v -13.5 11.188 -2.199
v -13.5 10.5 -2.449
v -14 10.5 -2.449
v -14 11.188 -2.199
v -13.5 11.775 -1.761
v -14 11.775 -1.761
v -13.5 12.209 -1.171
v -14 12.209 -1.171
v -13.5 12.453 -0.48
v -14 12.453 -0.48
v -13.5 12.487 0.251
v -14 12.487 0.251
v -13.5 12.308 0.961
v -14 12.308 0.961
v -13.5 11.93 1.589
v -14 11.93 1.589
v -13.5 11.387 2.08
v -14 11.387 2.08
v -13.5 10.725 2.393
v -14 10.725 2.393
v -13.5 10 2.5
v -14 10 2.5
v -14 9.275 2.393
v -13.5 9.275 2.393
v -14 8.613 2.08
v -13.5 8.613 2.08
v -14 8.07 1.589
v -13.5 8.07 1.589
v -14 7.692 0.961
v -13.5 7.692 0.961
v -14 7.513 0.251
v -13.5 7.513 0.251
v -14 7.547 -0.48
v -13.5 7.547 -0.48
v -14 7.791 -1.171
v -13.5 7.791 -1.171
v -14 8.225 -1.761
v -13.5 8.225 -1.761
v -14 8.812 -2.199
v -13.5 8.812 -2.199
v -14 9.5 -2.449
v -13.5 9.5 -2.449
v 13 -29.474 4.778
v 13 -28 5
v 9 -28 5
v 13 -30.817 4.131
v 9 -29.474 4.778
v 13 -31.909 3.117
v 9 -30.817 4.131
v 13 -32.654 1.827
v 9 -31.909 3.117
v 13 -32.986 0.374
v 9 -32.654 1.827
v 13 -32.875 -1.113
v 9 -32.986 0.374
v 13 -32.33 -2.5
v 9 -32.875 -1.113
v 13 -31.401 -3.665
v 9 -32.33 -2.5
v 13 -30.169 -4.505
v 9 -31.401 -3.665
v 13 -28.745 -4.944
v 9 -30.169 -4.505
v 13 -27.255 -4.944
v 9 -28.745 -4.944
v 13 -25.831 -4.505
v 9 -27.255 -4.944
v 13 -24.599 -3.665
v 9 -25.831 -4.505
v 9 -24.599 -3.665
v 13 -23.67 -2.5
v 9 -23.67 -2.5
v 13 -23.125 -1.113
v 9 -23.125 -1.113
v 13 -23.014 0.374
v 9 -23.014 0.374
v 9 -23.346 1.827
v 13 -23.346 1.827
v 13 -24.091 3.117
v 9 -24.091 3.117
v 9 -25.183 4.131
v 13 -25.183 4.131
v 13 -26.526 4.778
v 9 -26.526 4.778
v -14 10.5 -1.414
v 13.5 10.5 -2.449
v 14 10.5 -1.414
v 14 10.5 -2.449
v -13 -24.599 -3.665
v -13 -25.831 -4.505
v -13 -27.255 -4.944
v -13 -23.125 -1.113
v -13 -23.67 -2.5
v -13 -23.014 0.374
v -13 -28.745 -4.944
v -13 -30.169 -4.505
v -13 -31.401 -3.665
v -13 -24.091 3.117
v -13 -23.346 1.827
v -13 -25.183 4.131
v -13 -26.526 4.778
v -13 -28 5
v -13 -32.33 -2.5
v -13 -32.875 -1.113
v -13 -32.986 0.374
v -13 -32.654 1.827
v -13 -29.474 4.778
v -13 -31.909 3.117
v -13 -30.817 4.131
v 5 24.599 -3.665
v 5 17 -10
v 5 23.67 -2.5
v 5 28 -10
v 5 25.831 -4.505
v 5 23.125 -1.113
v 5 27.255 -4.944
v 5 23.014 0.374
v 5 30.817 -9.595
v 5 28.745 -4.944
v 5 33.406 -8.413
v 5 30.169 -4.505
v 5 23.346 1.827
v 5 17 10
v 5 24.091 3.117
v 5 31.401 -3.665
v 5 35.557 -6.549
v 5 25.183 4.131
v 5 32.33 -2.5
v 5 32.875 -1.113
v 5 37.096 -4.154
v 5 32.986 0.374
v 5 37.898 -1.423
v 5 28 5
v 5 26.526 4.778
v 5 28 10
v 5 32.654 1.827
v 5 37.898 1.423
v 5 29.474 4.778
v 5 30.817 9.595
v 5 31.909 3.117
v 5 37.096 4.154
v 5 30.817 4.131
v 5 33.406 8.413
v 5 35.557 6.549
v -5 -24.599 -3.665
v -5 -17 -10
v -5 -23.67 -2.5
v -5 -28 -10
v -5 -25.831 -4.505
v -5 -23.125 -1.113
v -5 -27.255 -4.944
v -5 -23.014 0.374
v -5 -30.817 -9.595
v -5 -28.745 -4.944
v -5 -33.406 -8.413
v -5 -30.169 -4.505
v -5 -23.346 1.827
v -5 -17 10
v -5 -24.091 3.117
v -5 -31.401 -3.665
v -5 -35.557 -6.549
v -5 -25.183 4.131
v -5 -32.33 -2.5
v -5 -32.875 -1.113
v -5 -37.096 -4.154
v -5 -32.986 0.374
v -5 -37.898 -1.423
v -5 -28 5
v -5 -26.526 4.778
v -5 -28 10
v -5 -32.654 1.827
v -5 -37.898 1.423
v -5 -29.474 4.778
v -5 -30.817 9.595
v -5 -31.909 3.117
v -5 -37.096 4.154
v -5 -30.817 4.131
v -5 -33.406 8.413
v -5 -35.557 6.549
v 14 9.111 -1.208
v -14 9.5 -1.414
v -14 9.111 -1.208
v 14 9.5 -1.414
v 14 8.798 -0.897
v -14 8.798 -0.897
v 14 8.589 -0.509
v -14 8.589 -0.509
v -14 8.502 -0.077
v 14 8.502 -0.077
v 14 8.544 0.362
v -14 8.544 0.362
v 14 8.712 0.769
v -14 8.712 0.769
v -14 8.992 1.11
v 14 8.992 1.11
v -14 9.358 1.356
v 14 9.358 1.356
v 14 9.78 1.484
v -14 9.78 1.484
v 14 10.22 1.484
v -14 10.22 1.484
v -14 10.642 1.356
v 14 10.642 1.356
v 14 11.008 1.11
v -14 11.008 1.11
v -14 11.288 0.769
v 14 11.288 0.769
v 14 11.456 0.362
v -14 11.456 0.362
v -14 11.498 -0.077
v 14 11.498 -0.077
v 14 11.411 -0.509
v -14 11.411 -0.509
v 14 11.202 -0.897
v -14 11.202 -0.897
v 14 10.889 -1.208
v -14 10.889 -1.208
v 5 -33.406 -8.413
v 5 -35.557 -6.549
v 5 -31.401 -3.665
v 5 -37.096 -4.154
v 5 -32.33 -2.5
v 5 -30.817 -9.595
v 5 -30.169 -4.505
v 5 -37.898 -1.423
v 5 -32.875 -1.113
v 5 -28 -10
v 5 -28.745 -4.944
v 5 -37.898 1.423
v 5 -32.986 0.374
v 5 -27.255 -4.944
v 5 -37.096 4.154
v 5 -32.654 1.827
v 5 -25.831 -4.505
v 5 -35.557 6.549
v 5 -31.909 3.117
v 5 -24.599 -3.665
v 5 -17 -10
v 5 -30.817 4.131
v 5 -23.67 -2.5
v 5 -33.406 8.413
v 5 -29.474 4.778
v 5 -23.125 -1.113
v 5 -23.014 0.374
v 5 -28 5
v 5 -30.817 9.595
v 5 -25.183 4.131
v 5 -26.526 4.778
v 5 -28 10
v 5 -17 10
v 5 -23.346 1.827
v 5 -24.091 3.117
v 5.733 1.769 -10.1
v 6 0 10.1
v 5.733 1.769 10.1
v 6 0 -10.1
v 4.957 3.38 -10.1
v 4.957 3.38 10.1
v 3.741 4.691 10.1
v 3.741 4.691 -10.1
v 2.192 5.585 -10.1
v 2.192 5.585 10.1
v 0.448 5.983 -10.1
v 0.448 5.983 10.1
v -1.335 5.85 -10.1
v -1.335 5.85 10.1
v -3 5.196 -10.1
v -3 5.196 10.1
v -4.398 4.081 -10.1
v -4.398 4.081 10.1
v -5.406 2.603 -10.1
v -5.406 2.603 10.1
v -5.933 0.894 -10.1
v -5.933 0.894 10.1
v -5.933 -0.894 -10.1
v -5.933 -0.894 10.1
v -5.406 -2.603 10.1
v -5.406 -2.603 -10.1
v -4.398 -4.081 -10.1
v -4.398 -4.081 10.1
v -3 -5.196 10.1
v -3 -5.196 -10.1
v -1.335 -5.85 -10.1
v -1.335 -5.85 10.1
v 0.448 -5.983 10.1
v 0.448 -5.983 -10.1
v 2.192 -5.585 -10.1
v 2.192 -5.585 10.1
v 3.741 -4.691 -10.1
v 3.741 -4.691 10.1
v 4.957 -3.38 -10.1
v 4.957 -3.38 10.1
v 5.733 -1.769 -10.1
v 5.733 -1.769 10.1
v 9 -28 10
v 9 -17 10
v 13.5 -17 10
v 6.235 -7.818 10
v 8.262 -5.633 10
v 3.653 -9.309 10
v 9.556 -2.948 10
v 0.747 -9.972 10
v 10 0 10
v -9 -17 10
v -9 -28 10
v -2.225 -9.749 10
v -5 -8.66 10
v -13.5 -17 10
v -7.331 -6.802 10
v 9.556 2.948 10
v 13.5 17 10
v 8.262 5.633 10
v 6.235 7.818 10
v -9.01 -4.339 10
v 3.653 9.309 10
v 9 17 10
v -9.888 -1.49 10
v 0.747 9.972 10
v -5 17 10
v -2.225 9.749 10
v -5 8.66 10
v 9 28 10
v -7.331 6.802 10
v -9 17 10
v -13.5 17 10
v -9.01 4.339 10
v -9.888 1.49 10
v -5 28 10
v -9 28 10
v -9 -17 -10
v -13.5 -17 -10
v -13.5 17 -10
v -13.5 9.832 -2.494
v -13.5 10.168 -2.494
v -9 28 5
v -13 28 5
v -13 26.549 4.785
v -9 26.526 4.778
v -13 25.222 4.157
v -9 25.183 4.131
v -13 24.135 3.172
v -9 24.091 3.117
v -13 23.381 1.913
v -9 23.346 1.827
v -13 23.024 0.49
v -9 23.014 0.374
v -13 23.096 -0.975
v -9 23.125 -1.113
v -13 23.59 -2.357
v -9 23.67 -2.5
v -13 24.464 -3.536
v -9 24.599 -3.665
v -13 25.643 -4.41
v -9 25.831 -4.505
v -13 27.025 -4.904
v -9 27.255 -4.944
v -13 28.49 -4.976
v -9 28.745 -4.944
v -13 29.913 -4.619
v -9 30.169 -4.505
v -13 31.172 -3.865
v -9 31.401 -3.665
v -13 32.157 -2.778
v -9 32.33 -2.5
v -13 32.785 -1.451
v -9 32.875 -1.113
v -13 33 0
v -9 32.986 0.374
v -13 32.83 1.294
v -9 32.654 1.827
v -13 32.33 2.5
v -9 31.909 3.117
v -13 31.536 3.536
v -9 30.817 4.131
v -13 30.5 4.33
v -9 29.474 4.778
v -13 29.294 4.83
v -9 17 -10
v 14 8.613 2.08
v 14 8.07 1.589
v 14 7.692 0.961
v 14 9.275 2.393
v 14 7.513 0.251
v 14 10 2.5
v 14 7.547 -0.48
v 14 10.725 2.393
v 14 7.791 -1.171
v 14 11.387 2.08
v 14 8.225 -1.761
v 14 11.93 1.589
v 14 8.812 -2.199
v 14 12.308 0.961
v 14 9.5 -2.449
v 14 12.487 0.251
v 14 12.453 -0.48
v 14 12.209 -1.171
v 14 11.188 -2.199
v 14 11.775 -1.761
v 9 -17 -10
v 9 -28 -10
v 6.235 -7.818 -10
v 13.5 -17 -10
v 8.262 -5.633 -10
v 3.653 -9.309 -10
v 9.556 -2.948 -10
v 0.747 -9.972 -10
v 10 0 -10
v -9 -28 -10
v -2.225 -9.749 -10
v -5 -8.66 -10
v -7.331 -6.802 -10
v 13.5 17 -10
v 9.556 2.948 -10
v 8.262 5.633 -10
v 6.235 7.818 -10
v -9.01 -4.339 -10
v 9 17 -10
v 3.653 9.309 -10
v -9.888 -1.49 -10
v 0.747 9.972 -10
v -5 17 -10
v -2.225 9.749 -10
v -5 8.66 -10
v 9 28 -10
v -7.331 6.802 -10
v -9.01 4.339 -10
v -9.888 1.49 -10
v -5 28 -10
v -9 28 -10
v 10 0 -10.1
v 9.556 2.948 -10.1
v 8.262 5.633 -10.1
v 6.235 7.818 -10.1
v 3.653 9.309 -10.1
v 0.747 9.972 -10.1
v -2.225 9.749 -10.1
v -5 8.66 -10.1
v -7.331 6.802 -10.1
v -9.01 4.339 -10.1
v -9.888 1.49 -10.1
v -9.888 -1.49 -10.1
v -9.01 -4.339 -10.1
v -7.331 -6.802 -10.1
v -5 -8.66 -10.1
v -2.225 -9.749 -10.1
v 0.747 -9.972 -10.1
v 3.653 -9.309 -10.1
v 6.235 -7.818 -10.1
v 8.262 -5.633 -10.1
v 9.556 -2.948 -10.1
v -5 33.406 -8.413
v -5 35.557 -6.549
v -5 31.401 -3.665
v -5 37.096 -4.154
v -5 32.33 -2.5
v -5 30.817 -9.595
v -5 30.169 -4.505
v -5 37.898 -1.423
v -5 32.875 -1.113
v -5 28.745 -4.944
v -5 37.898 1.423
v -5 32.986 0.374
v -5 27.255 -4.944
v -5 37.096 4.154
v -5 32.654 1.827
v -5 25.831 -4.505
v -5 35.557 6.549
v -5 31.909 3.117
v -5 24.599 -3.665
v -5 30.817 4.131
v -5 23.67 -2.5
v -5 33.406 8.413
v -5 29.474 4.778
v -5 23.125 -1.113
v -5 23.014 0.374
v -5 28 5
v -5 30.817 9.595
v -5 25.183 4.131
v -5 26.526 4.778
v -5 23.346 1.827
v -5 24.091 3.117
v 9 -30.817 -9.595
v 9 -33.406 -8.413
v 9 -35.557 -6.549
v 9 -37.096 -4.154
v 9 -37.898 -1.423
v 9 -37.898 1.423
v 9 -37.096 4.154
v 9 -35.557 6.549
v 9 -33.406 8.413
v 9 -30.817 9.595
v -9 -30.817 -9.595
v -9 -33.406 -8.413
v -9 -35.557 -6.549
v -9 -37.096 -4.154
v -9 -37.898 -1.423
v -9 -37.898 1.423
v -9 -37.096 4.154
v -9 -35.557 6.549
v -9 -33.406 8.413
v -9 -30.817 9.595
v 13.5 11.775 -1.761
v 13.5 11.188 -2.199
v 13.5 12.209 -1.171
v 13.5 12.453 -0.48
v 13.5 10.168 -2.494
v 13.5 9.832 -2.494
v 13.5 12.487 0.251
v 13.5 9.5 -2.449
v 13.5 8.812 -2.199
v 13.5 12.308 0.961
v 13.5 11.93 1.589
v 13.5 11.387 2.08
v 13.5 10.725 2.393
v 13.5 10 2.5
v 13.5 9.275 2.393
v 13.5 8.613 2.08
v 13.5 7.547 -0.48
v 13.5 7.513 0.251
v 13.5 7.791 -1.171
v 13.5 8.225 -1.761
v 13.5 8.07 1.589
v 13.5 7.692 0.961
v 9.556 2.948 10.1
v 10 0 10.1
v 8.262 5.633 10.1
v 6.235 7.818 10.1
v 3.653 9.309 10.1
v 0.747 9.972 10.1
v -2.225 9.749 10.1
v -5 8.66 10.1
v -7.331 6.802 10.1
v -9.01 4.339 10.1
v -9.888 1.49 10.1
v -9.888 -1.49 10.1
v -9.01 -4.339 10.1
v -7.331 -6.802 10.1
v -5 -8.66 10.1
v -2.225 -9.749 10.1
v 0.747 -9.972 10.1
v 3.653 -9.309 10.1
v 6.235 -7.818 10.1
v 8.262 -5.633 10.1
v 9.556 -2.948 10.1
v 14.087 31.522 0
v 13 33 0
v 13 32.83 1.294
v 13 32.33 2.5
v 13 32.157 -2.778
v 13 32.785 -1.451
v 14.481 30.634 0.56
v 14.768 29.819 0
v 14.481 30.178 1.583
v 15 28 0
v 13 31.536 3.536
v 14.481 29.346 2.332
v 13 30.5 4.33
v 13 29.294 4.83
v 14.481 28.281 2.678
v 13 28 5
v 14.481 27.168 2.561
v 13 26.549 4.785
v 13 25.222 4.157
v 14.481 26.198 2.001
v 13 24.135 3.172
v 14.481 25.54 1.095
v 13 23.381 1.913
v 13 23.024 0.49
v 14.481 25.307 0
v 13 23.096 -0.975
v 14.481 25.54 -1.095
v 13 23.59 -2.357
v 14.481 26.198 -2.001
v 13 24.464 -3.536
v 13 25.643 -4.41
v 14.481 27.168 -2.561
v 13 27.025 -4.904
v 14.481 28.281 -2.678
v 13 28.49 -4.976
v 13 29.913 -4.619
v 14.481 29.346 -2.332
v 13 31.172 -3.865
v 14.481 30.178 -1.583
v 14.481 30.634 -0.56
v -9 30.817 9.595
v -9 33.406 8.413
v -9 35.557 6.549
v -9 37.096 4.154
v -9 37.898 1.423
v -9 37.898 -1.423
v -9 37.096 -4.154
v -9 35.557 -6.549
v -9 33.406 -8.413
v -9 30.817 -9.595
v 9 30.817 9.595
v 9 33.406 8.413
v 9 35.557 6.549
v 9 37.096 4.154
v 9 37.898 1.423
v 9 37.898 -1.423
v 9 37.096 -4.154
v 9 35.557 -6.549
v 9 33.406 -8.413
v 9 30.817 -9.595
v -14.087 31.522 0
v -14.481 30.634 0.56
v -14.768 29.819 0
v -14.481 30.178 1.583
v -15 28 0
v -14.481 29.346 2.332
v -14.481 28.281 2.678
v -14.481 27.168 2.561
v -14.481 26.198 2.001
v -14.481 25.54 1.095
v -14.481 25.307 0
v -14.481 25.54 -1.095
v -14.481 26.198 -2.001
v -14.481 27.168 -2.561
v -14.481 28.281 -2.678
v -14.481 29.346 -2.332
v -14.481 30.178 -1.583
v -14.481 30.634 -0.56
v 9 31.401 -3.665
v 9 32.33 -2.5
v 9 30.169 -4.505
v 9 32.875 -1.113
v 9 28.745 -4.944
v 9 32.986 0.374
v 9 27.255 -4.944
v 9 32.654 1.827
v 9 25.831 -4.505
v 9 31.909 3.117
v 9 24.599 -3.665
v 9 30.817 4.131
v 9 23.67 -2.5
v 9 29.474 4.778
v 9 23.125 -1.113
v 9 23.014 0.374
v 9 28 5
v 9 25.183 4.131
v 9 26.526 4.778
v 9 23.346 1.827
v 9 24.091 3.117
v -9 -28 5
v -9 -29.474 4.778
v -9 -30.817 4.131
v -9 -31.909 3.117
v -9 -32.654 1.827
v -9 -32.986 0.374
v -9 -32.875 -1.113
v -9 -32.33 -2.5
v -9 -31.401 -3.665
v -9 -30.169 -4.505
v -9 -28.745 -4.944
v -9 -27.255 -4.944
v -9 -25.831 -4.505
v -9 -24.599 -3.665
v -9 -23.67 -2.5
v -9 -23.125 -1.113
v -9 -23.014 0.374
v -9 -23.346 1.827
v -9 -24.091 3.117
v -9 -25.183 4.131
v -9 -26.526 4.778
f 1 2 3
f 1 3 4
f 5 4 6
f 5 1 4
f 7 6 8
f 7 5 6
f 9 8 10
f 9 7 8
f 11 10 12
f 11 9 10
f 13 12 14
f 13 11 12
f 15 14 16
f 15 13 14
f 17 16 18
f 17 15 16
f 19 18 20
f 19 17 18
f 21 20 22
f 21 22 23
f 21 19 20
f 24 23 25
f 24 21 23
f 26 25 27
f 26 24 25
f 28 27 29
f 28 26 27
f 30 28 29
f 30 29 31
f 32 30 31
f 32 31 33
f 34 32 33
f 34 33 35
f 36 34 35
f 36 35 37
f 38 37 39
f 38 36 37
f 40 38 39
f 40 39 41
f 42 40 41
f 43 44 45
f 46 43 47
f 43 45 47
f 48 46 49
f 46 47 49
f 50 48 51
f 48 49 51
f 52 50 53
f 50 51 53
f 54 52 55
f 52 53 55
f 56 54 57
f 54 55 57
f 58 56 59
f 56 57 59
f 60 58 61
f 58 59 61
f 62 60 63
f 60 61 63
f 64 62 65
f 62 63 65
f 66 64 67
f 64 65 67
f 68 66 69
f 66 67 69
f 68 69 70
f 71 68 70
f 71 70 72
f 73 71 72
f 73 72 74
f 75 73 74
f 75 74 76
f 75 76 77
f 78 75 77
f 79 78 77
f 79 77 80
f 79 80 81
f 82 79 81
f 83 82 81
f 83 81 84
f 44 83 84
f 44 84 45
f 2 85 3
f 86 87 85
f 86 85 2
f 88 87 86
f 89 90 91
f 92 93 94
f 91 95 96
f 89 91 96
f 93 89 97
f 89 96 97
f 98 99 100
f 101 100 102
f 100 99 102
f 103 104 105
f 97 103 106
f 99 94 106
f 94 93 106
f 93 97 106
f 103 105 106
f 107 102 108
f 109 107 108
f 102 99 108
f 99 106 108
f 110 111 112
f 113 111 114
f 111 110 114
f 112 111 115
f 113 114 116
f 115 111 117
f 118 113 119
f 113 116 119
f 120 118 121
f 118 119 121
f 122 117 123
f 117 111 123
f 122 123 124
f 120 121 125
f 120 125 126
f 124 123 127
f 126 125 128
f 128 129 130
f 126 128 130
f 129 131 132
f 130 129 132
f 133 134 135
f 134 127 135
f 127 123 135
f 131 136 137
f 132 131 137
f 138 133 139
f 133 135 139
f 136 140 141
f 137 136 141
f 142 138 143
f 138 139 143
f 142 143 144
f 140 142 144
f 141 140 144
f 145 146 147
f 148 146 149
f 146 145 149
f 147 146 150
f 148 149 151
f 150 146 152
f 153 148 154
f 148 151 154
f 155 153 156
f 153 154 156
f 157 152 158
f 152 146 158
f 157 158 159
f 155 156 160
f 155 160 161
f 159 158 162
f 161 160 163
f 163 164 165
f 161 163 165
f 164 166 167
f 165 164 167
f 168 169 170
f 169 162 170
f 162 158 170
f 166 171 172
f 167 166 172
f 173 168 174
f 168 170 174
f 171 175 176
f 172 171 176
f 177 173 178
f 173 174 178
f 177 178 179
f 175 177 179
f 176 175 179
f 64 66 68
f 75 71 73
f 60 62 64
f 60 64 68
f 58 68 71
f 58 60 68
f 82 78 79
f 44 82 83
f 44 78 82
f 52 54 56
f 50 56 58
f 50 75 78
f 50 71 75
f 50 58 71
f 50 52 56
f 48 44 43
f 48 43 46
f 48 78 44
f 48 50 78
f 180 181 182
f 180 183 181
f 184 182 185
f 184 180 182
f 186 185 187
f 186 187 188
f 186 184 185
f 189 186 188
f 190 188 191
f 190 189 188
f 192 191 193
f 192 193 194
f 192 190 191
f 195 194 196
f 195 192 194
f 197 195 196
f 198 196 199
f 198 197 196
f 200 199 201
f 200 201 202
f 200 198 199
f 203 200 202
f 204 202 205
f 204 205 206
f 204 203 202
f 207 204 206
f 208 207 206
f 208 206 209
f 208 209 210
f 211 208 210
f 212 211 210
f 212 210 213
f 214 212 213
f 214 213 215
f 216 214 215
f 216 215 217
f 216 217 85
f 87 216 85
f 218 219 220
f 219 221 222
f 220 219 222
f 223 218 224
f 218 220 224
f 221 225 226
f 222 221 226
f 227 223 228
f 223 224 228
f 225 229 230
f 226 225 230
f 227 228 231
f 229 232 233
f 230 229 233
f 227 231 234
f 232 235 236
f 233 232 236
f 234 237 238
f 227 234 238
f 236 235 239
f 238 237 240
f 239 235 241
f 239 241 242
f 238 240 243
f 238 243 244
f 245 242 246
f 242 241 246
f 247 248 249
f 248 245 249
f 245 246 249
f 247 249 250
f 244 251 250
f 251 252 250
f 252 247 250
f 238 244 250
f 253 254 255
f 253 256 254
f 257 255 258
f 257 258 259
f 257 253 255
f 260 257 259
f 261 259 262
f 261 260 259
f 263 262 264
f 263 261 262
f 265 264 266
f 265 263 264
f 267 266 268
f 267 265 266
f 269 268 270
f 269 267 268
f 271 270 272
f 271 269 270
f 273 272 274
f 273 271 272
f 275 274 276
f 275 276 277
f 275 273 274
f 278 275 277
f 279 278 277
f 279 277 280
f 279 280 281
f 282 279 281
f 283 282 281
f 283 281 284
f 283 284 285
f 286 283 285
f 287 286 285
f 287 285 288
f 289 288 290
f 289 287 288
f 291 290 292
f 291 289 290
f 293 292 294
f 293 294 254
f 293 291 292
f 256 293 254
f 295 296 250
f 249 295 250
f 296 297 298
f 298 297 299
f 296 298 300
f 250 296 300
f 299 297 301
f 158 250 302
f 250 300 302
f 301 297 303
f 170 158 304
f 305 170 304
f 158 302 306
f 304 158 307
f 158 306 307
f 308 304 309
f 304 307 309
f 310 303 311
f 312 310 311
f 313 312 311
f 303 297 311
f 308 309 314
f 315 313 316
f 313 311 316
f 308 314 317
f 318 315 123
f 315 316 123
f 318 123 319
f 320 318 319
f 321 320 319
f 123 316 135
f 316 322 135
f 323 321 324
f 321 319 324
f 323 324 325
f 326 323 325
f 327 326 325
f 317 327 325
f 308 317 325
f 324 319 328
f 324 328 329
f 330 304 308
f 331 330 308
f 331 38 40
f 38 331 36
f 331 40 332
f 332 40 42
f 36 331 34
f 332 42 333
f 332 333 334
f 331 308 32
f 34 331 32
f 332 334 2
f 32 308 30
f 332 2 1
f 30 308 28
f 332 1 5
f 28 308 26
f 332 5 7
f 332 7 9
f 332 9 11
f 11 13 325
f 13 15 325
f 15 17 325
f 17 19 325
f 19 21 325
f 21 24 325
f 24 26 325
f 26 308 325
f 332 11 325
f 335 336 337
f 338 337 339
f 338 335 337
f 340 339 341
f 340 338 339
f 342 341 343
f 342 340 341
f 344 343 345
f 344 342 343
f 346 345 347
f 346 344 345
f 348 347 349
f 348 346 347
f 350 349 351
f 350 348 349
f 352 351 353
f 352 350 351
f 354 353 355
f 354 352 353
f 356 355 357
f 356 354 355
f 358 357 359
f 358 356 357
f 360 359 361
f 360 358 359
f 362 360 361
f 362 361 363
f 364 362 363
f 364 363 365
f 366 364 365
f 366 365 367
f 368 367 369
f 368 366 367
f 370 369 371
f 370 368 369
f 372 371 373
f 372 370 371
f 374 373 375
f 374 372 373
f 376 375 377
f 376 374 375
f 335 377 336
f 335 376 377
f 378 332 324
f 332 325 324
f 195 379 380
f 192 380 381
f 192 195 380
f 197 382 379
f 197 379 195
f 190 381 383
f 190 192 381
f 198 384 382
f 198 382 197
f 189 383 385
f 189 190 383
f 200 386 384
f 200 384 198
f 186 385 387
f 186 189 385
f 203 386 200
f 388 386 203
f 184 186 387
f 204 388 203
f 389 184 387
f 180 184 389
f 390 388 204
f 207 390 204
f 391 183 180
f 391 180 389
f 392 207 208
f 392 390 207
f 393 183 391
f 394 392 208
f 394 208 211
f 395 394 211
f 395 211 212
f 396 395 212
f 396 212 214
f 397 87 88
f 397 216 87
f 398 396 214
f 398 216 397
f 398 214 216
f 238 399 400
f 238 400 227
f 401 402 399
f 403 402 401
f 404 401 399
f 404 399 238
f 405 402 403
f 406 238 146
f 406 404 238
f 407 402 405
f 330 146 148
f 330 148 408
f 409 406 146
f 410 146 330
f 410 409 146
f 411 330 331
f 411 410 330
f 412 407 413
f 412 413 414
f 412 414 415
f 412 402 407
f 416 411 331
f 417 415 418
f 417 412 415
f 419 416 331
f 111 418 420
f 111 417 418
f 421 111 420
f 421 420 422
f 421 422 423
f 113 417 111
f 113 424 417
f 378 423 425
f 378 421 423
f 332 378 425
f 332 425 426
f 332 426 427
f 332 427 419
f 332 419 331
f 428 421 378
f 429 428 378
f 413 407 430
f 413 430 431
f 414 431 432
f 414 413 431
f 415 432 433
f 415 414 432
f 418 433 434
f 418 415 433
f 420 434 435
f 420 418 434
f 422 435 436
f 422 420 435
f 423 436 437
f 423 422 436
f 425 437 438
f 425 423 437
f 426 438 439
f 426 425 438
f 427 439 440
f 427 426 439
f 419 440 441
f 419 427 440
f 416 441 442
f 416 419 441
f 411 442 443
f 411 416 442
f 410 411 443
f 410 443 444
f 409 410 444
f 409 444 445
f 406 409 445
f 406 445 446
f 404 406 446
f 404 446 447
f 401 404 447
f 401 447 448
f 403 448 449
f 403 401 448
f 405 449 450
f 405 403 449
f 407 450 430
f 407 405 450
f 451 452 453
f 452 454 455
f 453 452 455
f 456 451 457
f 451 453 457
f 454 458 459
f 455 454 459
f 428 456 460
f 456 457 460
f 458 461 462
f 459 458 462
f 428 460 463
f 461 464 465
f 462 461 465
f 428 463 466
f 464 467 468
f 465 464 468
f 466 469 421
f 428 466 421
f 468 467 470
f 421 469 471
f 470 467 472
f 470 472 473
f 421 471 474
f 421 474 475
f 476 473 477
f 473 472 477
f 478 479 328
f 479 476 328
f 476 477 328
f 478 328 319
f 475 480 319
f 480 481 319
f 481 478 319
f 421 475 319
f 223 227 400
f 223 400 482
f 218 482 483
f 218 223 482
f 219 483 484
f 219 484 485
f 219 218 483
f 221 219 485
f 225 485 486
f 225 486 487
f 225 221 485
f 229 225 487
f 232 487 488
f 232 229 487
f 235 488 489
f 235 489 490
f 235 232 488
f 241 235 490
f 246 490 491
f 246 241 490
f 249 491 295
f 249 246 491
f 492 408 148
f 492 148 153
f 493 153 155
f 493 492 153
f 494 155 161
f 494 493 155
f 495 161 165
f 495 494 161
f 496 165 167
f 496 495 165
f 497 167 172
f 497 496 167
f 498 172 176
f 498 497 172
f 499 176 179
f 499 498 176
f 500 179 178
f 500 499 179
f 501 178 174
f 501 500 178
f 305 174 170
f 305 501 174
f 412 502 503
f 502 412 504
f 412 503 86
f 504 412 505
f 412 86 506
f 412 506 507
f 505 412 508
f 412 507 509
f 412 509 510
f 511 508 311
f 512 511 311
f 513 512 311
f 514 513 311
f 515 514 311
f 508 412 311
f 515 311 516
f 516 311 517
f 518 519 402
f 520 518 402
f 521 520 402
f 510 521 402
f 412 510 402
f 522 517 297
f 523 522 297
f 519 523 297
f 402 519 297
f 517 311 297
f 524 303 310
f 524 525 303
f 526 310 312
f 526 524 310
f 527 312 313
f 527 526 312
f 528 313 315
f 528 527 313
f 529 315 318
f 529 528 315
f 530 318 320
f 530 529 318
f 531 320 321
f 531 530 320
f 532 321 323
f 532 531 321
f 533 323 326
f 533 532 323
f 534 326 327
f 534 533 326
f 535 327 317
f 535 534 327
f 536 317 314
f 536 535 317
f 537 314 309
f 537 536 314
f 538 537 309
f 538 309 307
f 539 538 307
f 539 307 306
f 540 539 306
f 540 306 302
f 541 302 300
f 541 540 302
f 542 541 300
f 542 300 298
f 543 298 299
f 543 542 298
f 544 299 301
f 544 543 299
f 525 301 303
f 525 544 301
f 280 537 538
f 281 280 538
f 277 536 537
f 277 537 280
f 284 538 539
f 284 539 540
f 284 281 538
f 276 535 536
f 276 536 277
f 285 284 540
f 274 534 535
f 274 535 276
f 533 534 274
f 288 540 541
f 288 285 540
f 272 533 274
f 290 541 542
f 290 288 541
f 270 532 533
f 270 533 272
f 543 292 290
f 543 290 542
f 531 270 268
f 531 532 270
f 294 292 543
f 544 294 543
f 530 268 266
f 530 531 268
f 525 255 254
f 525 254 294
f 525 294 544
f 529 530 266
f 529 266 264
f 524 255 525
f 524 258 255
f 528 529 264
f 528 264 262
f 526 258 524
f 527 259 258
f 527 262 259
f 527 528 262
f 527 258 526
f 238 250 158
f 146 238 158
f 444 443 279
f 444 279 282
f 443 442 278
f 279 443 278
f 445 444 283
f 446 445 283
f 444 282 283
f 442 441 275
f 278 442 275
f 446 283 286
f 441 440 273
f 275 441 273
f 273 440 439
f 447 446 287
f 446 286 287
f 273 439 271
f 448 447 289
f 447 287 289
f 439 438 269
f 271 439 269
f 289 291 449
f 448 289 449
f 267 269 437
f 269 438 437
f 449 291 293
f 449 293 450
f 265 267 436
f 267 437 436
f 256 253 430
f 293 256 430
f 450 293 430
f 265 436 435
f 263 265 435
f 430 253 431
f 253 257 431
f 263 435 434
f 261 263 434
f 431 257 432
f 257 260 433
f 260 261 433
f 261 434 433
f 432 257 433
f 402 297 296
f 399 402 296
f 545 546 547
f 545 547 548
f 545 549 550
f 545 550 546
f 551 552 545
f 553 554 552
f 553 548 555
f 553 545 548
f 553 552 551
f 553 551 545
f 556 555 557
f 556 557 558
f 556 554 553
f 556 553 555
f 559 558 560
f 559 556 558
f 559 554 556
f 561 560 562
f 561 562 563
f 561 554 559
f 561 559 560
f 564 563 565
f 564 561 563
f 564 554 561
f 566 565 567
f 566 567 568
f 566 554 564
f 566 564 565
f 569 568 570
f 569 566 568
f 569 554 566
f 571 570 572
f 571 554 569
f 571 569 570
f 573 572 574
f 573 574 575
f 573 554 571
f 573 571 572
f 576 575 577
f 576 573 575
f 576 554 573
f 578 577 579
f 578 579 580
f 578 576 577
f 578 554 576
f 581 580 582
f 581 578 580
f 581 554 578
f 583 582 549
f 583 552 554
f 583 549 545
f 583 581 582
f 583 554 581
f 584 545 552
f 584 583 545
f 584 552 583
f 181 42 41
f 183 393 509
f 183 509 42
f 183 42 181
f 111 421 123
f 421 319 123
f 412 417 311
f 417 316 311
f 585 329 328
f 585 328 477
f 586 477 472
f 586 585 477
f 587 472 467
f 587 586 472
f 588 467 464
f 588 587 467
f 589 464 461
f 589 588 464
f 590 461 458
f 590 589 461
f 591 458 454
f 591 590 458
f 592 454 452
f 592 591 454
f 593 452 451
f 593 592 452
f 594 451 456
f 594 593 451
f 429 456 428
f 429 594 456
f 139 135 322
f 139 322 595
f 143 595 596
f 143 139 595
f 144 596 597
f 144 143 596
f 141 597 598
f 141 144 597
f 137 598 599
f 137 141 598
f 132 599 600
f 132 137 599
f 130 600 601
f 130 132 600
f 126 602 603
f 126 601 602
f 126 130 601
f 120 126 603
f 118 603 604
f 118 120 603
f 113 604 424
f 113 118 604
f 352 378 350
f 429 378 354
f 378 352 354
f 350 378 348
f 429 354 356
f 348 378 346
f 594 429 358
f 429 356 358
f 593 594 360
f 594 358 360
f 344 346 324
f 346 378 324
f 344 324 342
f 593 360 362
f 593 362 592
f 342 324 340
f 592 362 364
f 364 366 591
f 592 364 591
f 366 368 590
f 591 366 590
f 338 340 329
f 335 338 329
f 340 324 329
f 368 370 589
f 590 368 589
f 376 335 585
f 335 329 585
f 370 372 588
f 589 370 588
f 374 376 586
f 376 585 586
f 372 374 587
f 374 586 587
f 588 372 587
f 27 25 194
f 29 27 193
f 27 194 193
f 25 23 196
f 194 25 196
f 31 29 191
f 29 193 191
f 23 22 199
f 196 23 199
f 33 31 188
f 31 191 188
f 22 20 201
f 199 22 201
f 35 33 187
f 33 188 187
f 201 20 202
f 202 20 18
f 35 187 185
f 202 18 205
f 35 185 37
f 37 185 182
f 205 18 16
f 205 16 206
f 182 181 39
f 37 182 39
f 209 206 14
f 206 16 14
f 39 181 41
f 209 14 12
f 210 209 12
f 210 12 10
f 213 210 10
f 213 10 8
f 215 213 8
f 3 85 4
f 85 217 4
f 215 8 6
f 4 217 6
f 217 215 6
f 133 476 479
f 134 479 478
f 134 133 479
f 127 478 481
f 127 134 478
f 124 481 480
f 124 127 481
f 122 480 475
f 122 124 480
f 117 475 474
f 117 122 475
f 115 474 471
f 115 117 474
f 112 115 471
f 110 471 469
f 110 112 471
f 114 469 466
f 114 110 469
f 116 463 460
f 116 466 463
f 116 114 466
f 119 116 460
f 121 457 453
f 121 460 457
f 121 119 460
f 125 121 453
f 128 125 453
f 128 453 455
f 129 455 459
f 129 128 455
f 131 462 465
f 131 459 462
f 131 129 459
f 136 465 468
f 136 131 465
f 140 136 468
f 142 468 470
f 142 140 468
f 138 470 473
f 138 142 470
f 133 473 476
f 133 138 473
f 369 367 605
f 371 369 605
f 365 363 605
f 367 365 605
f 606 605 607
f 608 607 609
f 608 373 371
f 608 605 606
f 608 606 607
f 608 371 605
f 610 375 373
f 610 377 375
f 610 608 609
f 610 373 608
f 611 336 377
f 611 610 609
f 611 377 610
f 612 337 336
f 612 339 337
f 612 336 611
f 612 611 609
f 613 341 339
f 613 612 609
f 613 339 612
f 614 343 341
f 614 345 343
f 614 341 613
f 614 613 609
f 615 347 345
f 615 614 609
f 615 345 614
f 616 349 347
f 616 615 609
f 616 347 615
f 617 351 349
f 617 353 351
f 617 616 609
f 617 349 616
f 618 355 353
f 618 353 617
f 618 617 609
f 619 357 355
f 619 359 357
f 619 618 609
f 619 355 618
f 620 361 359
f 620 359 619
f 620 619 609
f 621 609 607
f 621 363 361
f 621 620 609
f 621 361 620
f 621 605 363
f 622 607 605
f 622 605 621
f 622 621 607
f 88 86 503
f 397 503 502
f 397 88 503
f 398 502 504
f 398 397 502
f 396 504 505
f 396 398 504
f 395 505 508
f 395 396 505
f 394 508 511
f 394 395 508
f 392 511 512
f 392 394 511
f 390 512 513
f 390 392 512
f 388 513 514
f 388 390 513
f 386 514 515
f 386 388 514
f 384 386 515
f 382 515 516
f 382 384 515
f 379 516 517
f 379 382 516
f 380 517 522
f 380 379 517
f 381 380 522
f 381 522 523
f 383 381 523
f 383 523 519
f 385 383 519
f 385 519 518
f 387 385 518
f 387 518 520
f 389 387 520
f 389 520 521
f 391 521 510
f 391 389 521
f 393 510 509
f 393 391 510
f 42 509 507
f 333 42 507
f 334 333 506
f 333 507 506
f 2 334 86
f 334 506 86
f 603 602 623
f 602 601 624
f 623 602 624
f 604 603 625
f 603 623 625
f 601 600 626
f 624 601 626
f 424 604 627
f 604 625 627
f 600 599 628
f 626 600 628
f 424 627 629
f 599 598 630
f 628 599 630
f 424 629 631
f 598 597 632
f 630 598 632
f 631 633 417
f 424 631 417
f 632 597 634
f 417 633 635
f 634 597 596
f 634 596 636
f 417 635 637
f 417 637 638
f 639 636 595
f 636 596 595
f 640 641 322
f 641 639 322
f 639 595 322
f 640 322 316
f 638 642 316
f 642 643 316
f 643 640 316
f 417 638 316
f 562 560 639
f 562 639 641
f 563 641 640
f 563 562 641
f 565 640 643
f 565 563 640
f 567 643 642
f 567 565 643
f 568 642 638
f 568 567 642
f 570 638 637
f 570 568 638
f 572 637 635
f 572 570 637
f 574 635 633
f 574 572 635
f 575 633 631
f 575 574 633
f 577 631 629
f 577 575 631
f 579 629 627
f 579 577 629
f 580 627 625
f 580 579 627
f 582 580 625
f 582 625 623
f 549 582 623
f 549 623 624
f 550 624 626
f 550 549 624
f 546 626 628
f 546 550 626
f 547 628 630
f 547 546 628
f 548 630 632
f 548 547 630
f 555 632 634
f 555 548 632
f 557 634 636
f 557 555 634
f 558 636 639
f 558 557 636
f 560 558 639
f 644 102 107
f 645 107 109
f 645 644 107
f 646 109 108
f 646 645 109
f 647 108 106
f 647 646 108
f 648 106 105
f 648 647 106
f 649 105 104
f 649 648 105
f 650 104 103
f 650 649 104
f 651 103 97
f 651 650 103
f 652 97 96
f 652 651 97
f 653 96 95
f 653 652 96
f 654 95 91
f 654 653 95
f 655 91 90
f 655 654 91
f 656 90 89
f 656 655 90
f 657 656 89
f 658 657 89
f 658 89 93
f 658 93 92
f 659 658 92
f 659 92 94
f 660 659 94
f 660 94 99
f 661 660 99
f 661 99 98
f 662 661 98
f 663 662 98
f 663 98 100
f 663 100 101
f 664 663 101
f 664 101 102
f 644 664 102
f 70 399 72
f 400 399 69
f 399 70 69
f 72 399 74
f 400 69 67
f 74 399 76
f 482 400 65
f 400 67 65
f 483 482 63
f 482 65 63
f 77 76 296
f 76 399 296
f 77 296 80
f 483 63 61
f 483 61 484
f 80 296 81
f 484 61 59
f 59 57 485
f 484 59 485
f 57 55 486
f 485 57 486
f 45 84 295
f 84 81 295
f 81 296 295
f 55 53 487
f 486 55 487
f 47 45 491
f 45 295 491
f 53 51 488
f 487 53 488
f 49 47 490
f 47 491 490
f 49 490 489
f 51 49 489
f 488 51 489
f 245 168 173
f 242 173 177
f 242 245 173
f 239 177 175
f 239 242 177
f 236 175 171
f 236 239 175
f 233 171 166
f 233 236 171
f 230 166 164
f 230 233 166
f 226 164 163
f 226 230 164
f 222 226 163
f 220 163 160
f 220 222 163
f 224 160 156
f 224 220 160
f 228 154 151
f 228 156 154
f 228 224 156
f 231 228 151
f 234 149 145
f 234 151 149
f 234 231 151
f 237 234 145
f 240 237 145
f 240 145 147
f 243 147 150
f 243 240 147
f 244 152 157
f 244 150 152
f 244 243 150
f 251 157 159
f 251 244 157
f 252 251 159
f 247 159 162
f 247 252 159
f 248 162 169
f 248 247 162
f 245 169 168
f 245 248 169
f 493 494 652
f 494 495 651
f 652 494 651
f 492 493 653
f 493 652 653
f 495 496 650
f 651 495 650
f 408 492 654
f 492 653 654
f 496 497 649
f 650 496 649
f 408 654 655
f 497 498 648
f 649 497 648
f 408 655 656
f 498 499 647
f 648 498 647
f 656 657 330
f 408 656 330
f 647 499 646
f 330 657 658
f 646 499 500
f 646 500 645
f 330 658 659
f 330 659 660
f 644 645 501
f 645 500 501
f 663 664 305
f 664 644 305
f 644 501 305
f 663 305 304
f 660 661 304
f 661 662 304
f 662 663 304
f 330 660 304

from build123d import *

# Parameters (mm, degrees)
ESQUISSE1_R          = 10
BASE_EXTRUSION_DEPTH = 10
ESQUISSE2_OUTSIDE_W  = 38.62
ESQUISSE2_OUTSIDE_H  = 94.62
D_TOURAGE_DEPTH      = 48.675989764
ESQUISSE3_R          = 5
AL_SAGES_DEPTH       = 46.279686395
ESQUISSE4_R          = 5
AXES_DEPTH           = 13
ESQUISSE5_R          = 10
ESQUISSE5_R_2        = 6
ECROU_RAPPORT_DEPTH  = 10.1
ESQUISSE6_R          = 2.5
PER_AGE_DEPTH        = 49.561919237
GOUPILLE_DEPTH       = 14


# Read off the part's stored shape, not the designer's step: Dôme1, Dôme2
with BuildPart() as part:
    # Esquisse1 → Base-Extrusion (new, symmetric)
    with BuildSketch(Plane.XY):
        Polygon((-13.5, -17), (-13.5, 17), (-9, 17), (-9, 38), (-5, 38), (-5, 17), (5, 17), (5, 38), (9, 38), (9, 17), (13.5, 17), (13.5, -17), (9, -17), (9, -38), (5, -38), (5, -17), (-5, -17), (-5, -38), (-9, -38), (-9, -17), align=None)
        Circle(ESQUISSE1_R, mode=Mode.SUBTRACT)
    extrude(amount=BASE_EXTRUSION_DEPTH, both=True)

    # Esquisse2 outside → Détourage (cut, through all)
    with BuildSketch(Plane.ZY.offset(13.5)):
        Rectangle(ESQUISSE2_OUTSIDE_W, ESQUISSE2_OUTSIDE_H)
        with BuildLine():
            Line((-10, 28), (-10, -28))
            ThreePointArc((-10, -28), (0, -38), (10, -28))
            Line((10, -28), (10, 28))
            ThreePointArc((10, 28), (0, 38), (-10, 28))
        make_face(mode=Mode.SUBTRACT)
    extrude(amount=-D_TOURAGE_DEPTH, mode=Mode.SUBTRACT)

    # Esquisse3 → Alésages (cut, through all)
    with BuildSketch(Plane.ZY.offset(9)):
        with Locations(Location((0, 28, 0), (0, 0, 270))):
            Circle(ESQUISSE3_R)
        with Locations(Location((0, -28, 0), (0, 0, 270))):
            Circle(ESQUISSE3_R)
    extrude(amount=-AL_SAGES_DEPTH, mode=Mode.SUBTRACT)

    # Esquisse4 → Axes (add, symmetric)
    with BuildSketch(Plane(origin=(0, 0, 0), x_dir=(0, 0, -1), z_dir=(1, 0, 0))):
        with Locations(Location((0, -28, 0), (0, 0, 180))):
            Circle(ESQUISSE4_R)
        with Locations(Location((0, 28, 0), (0, 0, 180))):
            Circle(ESQUISSE4_R)
    extrude(amount=AXES_DEPTH, both=True)

    # Dôme1 outline → Dôme1 (revolve)
    with BuildSketch(Plane(origin=(0, 28, 0), x_dir=(0, 1, 0), z_dir=(0, 0, -1))):
        with BuildLine():
            Line((0, 13), (5.000000005, 12.999999995))
            ThreePointArc((5.000000005, 12.999999995), (2.692582407, 14.481456008), (0, 15))
            Line((0, 15), (0, 13))
        make_face()
    revolve(axis=Axis((0, 28, 0), (1, 0, 0)))

    # Dôme2 outline → Dôme2 (revolve)
    with BuildSketch(Plane(origin=(0, 28, 0), x_dir=(0, 1, 0), z_dir=(0, 0, -1))):
        with BuildLine():
            Line((0, -12.999999995), (0, -15))
            ThreePointArc((0, -15), (2.692582407, -14.481456008), (5.000000005, -12.999999995))
            Line((5.000000005, -12.999999995), (0, -12.999999995))
        make_face()
    revolve(axis=Axis((0, 28, 0), (1, 0, 0)))

    # Esquisse5 → Ecrou rapporté (add, symmetric)
    with BuildSketch(Plane.XY):
        Circle(ESQUISSE5_R)
        Circle(ESQUISSE5_R_2, mode=Mode.SUBTRACT)
    extrude(amount=ECROU_RAPPORT_DEPTH, both=True)

    # Esquisse6 → Perçage (cut, through all)
    with BuildSketch(Plane(origin=(13.5, 0, 0), x_dir=(0, 0, -1), z_dir=(1, 0, 0))):
        with Locations((0, 10)):
            Circle(ESQUISSE6_R)
    extrude(amount=-PER_AGE_DEPTH, mode=Mode.SUBTRACT)

    # Esquisse7 → Goupille (add, symmetric)
    with BuildSketch(Plane(origin=(0, 0, 0), x_dir=(0, 0, -1), z_dir=(1, 0, 0))):
        with BuildLine():
            Line((1.414213562, 10.5), (2.449489743, 10.5))
            ThreePointArc((2.449489743, 10.5), (-2.5, 10), (2.449489743, 9.5))
            Line((2.449489743, 9.5), (1.414213562, 9.5))
            ThreePointArc((1.414213562, 9.5), (-1.5, 10), (1.414213562, 10.5))
        make_face()
    extrude(amount=GOUPILLE_DEPTH, both=True)


solid = part.part
